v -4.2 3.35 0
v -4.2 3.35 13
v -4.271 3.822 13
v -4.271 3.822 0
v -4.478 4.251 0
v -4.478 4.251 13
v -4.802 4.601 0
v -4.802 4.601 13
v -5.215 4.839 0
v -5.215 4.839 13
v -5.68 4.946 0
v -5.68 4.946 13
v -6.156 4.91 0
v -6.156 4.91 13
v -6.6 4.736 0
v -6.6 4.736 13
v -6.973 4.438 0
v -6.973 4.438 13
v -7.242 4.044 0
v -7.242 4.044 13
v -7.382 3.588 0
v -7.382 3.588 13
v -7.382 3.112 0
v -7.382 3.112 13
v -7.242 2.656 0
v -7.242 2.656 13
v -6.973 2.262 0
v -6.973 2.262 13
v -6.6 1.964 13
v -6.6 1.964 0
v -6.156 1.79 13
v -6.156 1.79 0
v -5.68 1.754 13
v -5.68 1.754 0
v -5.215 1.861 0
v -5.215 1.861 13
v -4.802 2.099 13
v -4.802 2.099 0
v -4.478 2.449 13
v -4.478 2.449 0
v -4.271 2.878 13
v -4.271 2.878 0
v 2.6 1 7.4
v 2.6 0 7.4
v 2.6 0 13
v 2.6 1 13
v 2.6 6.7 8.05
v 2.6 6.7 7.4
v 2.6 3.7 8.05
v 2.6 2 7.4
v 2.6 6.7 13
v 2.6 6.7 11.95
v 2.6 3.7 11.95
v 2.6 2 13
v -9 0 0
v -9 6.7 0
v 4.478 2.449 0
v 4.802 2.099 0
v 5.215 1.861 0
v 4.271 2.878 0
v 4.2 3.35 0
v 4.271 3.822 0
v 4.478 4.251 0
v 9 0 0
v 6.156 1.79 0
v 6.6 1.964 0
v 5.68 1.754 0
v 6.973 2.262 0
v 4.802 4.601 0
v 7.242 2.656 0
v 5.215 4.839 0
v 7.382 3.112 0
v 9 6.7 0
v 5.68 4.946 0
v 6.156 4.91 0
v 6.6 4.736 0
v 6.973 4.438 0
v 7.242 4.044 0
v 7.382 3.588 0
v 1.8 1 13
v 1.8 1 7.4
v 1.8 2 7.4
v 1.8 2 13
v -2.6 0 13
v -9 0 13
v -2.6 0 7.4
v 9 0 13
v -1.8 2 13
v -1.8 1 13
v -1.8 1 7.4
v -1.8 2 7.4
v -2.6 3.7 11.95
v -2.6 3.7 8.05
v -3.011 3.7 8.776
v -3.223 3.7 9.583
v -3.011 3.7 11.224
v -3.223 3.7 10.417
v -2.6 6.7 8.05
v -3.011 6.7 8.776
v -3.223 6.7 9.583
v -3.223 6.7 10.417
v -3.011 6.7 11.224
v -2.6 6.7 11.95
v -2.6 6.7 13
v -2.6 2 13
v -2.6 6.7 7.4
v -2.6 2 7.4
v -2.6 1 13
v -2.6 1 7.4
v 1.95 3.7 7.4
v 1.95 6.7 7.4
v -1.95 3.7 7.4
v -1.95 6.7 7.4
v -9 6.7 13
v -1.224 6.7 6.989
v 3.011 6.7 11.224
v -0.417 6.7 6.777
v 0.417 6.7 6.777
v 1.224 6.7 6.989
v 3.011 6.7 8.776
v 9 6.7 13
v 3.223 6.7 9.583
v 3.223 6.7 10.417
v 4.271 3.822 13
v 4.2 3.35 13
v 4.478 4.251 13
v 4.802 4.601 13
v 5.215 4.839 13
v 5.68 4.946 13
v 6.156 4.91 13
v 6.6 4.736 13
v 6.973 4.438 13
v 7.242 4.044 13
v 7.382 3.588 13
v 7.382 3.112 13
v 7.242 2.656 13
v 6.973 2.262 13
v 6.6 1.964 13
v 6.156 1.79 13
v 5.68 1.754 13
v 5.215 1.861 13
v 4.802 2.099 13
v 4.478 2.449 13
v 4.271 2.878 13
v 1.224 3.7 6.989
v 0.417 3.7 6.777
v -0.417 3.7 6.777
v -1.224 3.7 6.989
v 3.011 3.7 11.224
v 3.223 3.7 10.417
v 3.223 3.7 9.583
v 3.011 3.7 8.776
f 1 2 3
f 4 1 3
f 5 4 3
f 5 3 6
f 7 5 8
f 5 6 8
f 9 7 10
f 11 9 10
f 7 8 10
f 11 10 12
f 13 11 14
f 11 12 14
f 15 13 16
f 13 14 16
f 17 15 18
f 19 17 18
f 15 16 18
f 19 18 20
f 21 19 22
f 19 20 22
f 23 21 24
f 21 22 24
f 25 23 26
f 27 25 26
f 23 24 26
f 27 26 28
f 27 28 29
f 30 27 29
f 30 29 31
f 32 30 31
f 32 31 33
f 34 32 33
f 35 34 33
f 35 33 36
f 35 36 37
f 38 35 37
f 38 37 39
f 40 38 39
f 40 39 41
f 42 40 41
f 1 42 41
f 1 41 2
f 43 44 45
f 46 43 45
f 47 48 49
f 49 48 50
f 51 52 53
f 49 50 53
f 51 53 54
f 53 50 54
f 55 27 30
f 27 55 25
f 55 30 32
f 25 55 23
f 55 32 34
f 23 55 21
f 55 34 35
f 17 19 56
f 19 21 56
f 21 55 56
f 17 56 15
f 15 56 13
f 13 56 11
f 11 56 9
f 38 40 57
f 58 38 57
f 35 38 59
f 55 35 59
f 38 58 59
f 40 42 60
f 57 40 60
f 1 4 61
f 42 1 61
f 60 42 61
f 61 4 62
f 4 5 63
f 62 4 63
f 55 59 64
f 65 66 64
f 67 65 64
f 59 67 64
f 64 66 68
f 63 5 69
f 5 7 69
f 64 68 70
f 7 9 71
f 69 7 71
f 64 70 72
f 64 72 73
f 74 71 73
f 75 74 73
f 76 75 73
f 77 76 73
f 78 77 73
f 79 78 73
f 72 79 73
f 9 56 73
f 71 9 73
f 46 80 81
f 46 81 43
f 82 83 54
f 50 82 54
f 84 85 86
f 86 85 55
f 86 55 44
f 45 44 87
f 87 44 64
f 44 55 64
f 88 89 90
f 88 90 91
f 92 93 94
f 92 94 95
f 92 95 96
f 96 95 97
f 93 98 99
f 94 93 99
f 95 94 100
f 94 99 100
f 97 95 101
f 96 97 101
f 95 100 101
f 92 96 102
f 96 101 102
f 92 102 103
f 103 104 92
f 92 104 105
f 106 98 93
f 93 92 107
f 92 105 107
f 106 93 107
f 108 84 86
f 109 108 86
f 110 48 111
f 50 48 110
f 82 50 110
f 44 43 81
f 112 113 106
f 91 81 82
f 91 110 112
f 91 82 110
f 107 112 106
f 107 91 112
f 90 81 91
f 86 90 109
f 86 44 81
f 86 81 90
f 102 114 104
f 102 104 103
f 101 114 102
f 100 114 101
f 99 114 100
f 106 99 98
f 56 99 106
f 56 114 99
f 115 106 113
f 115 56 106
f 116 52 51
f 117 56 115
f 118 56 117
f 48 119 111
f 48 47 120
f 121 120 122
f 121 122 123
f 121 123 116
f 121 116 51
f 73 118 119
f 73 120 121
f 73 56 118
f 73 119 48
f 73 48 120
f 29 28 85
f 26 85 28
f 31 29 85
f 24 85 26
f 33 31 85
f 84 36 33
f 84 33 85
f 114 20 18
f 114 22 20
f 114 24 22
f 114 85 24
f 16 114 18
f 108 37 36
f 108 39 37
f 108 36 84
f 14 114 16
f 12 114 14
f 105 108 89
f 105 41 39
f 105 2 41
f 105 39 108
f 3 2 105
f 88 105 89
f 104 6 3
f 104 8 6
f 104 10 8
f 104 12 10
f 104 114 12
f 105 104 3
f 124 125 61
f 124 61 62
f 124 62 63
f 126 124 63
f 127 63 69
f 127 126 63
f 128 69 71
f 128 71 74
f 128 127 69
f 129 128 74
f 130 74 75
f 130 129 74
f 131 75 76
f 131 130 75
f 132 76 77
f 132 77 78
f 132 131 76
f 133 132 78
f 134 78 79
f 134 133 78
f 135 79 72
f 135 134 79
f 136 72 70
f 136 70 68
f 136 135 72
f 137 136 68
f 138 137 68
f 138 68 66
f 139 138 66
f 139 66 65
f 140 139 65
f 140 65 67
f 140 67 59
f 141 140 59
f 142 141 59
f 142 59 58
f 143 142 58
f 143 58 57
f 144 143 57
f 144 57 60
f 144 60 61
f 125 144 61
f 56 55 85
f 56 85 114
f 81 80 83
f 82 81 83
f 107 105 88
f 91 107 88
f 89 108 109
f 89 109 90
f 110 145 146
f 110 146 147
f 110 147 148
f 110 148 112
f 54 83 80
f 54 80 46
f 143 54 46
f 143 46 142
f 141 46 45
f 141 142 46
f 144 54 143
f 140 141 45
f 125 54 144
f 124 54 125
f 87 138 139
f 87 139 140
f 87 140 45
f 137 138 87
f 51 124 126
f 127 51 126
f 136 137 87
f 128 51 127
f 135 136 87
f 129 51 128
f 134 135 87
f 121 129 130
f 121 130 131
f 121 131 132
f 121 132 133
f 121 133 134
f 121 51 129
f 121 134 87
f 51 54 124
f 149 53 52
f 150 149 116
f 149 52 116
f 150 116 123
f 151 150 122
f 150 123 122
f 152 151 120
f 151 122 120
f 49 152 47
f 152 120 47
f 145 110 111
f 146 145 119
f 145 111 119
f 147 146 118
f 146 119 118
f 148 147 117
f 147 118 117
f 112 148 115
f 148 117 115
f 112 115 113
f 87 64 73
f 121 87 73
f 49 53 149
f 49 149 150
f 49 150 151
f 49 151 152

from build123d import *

# Parameters (mm, degrees)
SKETCH1_W           = 18
SKETCH1_H           = 6.7
BOSS_EXTRUDE1_DEPTH = 13
CUT_EXTRUDE1_REACH  = 19.172
SKETCH3_R           = 3.25
CUT_EXTRUDE2_DEPTH  = 3
SKETCH4_W           = 0.8
SKETCH4_H           = 1
BOSS_EXTRUDE2_DEPTH = 5.6
CUT_EXTRUDE3_REACH  = 19.172
SKETCH8_R           = 1.6


with BuildPart() as part:
    # Sketch1 → Boss-Extrude1 (new body)
    with BuildSketch(Plane.XY):
        with Locations((0, 3.35)):
            Rectangle(SKETCH1_W, SKETCH1_H)
    extrude(amount=BOSS_EXTRUDE1_DEPTH)

    # Sketch2 → Cut-Extrude1 (cut, up to next)
    with BuildSketch(Plane.XZ, mode=Mode.PRIVATE) as cut_extrude1_sk1:
        Polygon((-2.6, 12.6), (-2.6, 13), (2.6, 13), (2.6, 12.6), (2.6, 7.4), (-2.6, 7.4), align=None)
    cut_extrude1_tool1 = extrude(cut_extrude1_sk1.sketch, amount=-CUT_EXTRUDE1_REACH, mode=Mode.PRIVATE) & part.part
    add(cut_extrude1_tool1.solids().sort_by_distance((0, 0, 10.2))[0], mode=Mode.SUBTRACT)

    # Sketch3 → Cut-Extrude2 (cut)
    with BuildSketch(Plane(origin=(0, 6.7, 0), x_dir=(1, 0, 0), z_dir=(0, 1, 0))):
        with Locations((0, -10)):
            Circle(SKETCH3_R)
    extrude(amount=-CUT_EXTRUDE2_DEPTH, mode=Mode.SUBTRACT)

    # Sketch4 → Boss-Extrude2 (add)
    with BuildSketch(Plane.XY.offset(13)):
        with Locations((-2.2, 1.5)):
            Rectangle(SKETCH4_W, SKETCH4_H)
        with Locations((2.2, 1.5)):
            Rectangle(SKETCH4_W, SKETCH4_H)
    extrude(amount=-BOSS_EXTRUDE2_DEPTH)

    # Sketch8 → Cut-Extrude3 (cut, up to next)
    with BuildSketch(Plane.XY.offset(13), mode=Mode.PRIVATE) as cut_extrude3_sk1:
        with Locations((-5.8, 3.35)):
            Circle(SKETCH8_R)
    cut_extrude3_tool1 = extrude(cut_extrude3_sk1.sketch, amount=-CUT_EXTRUDE3_REACH, mode=Mode.PRIVATE) & part.part
    cut_extrude3 = cut_extrude3_tool1.solids().sort_by_distance((-5.8, 3.35, 13))[0]
    add(cut_extrude3, mode=Mode.SUBTRACT)

    # Mirror1: Cut-Extrude3 across plane
    add(cut_extrude3.mirror(Plane(origin=(0, 0, 0), x_dir=(0, 0, 1), z_dir=(1, 0, 0))), mode=Mode.SUBTRACT)


solid = part.part
